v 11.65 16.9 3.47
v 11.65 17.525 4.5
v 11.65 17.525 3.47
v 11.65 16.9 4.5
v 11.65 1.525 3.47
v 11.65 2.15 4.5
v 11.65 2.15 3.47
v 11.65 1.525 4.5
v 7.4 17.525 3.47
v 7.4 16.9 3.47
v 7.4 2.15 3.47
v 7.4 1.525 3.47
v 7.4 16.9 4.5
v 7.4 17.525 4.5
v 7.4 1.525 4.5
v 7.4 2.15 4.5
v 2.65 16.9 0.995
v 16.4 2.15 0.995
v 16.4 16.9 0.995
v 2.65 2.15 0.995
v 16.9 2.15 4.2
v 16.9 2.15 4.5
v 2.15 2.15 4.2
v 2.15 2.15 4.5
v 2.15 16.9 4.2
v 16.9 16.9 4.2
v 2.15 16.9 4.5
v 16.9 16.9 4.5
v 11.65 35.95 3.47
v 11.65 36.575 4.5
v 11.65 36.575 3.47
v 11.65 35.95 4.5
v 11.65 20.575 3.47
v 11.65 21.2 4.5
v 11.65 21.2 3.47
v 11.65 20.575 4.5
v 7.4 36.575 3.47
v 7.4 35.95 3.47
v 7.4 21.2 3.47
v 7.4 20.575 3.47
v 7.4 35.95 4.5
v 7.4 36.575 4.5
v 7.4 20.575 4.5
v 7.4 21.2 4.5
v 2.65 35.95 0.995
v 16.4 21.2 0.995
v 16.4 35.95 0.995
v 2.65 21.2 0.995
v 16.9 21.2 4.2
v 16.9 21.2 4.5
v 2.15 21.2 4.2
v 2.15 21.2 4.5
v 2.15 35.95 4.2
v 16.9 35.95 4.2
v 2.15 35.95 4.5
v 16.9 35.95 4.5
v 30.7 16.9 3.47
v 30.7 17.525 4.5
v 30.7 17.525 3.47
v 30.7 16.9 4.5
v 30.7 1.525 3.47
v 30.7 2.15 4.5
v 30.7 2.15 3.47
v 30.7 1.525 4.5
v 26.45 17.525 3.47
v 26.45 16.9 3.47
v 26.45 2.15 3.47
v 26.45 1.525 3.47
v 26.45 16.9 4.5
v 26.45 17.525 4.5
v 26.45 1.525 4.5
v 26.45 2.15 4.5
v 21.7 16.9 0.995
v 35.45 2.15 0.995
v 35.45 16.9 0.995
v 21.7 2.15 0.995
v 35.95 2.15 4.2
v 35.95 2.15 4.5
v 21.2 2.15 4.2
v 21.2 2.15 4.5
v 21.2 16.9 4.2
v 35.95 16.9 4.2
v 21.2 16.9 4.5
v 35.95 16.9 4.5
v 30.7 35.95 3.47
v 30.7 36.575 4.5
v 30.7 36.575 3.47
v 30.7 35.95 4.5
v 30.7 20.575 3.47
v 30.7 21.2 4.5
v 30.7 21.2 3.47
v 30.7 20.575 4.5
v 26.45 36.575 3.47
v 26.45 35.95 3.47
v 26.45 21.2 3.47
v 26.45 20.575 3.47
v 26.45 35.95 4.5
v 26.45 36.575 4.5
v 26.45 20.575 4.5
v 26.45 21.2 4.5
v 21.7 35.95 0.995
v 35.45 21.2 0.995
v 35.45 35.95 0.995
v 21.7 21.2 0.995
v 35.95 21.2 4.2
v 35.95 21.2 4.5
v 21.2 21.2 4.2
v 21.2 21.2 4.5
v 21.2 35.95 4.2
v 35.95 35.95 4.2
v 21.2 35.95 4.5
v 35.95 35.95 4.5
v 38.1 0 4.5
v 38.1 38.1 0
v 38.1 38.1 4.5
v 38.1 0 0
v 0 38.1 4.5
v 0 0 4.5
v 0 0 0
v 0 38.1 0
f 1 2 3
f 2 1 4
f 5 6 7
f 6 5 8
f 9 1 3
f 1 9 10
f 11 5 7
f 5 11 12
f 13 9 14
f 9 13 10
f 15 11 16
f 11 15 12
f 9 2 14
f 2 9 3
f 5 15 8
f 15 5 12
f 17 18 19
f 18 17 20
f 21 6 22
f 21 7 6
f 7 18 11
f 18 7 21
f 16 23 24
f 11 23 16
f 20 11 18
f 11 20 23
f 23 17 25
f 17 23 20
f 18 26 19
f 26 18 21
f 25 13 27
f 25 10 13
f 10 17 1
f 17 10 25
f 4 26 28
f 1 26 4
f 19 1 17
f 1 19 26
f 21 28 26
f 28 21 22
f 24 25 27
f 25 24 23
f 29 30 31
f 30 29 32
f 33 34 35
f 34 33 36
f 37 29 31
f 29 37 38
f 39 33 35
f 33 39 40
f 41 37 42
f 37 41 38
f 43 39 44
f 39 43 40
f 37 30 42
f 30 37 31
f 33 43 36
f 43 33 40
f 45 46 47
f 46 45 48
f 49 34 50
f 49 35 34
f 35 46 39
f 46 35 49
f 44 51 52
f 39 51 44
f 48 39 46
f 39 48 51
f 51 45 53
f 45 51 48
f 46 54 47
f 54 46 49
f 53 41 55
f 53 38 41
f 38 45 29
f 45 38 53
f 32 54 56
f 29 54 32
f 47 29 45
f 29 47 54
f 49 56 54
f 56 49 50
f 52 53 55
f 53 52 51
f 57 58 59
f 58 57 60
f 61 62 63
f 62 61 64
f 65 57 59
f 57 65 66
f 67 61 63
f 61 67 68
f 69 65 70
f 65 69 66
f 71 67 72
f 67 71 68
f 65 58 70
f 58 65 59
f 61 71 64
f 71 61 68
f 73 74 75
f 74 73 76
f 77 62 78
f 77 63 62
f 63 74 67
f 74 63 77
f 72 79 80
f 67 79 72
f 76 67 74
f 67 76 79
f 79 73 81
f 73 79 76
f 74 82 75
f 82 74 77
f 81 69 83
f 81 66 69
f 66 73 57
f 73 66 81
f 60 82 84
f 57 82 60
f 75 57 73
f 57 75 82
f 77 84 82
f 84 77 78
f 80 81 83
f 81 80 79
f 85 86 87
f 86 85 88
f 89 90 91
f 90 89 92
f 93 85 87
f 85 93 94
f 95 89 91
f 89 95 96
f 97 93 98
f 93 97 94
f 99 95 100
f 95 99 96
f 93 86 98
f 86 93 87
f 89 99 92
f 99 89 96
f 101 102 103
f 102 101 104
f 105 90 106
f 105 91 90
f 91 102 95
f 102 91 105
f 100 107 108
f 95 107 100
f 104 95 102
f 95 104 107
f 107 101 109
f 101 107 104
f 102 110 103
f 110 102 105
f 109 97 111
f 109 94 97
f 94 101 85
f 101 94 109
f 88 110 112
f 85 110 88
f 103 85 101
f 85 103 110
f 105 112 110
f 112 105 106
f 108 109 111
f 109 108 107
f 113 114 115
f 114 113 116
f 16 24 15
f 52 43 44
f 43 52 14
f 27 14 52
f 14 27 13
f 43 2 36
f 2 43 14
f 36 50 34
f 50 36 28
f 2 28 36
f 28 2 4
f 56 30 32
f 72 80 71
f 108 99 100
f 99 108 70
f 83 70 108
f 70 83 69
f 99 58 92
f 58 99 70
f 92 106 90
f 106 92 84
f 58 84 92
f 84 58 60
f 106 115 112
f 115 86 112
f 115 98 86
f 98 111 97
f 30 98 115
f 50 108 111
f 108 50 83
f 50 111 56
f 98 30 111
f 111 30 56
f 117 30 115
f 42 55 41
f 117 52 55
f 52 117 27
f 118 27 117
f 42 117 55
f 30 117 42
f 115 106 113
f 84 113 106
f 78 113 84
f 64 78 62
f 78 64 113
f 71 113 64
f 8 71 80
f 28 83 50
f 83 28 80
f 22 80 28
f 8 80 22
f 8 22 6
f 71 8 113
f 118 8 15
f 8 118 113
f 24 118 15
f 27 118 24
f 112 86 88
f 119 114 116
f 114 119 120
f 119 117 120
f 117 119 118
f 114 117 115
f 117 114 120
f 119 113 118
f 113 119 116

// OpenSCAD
$fs = 0.1;
$fa = 10;

module key_switch_hole() {
    translate([0, 0, 1]) union() {
        translate([-4.25 / 2, -16 / 2, 2.47]) cube([4.25, 16, 2.53]);

        hull() {
            translate([-14.75 / 2, -14.75 / 2, 3.2]) cube([14.75, 14.75, 1.8]);
            cube([13.75, 14.75, 0.01], center = true);
        }
    }
}

difference() {
    cube([2 * 19.05, 2 * 19.05, 1 + 5 - 1.5]);
    translate([0.5 * 19.05, 0.5 * 19.05]) key_switch_hole();
    translate([0.5 * 19.05, 1.5 * 19.05]) key_switch_hole();
    translate([1.5 * 19.05, 0.5 * 19.05]) key_switch_hole();
    translate([1.5 * 19.05, 1.5 * 19.05]) key_switch_hole();
}
